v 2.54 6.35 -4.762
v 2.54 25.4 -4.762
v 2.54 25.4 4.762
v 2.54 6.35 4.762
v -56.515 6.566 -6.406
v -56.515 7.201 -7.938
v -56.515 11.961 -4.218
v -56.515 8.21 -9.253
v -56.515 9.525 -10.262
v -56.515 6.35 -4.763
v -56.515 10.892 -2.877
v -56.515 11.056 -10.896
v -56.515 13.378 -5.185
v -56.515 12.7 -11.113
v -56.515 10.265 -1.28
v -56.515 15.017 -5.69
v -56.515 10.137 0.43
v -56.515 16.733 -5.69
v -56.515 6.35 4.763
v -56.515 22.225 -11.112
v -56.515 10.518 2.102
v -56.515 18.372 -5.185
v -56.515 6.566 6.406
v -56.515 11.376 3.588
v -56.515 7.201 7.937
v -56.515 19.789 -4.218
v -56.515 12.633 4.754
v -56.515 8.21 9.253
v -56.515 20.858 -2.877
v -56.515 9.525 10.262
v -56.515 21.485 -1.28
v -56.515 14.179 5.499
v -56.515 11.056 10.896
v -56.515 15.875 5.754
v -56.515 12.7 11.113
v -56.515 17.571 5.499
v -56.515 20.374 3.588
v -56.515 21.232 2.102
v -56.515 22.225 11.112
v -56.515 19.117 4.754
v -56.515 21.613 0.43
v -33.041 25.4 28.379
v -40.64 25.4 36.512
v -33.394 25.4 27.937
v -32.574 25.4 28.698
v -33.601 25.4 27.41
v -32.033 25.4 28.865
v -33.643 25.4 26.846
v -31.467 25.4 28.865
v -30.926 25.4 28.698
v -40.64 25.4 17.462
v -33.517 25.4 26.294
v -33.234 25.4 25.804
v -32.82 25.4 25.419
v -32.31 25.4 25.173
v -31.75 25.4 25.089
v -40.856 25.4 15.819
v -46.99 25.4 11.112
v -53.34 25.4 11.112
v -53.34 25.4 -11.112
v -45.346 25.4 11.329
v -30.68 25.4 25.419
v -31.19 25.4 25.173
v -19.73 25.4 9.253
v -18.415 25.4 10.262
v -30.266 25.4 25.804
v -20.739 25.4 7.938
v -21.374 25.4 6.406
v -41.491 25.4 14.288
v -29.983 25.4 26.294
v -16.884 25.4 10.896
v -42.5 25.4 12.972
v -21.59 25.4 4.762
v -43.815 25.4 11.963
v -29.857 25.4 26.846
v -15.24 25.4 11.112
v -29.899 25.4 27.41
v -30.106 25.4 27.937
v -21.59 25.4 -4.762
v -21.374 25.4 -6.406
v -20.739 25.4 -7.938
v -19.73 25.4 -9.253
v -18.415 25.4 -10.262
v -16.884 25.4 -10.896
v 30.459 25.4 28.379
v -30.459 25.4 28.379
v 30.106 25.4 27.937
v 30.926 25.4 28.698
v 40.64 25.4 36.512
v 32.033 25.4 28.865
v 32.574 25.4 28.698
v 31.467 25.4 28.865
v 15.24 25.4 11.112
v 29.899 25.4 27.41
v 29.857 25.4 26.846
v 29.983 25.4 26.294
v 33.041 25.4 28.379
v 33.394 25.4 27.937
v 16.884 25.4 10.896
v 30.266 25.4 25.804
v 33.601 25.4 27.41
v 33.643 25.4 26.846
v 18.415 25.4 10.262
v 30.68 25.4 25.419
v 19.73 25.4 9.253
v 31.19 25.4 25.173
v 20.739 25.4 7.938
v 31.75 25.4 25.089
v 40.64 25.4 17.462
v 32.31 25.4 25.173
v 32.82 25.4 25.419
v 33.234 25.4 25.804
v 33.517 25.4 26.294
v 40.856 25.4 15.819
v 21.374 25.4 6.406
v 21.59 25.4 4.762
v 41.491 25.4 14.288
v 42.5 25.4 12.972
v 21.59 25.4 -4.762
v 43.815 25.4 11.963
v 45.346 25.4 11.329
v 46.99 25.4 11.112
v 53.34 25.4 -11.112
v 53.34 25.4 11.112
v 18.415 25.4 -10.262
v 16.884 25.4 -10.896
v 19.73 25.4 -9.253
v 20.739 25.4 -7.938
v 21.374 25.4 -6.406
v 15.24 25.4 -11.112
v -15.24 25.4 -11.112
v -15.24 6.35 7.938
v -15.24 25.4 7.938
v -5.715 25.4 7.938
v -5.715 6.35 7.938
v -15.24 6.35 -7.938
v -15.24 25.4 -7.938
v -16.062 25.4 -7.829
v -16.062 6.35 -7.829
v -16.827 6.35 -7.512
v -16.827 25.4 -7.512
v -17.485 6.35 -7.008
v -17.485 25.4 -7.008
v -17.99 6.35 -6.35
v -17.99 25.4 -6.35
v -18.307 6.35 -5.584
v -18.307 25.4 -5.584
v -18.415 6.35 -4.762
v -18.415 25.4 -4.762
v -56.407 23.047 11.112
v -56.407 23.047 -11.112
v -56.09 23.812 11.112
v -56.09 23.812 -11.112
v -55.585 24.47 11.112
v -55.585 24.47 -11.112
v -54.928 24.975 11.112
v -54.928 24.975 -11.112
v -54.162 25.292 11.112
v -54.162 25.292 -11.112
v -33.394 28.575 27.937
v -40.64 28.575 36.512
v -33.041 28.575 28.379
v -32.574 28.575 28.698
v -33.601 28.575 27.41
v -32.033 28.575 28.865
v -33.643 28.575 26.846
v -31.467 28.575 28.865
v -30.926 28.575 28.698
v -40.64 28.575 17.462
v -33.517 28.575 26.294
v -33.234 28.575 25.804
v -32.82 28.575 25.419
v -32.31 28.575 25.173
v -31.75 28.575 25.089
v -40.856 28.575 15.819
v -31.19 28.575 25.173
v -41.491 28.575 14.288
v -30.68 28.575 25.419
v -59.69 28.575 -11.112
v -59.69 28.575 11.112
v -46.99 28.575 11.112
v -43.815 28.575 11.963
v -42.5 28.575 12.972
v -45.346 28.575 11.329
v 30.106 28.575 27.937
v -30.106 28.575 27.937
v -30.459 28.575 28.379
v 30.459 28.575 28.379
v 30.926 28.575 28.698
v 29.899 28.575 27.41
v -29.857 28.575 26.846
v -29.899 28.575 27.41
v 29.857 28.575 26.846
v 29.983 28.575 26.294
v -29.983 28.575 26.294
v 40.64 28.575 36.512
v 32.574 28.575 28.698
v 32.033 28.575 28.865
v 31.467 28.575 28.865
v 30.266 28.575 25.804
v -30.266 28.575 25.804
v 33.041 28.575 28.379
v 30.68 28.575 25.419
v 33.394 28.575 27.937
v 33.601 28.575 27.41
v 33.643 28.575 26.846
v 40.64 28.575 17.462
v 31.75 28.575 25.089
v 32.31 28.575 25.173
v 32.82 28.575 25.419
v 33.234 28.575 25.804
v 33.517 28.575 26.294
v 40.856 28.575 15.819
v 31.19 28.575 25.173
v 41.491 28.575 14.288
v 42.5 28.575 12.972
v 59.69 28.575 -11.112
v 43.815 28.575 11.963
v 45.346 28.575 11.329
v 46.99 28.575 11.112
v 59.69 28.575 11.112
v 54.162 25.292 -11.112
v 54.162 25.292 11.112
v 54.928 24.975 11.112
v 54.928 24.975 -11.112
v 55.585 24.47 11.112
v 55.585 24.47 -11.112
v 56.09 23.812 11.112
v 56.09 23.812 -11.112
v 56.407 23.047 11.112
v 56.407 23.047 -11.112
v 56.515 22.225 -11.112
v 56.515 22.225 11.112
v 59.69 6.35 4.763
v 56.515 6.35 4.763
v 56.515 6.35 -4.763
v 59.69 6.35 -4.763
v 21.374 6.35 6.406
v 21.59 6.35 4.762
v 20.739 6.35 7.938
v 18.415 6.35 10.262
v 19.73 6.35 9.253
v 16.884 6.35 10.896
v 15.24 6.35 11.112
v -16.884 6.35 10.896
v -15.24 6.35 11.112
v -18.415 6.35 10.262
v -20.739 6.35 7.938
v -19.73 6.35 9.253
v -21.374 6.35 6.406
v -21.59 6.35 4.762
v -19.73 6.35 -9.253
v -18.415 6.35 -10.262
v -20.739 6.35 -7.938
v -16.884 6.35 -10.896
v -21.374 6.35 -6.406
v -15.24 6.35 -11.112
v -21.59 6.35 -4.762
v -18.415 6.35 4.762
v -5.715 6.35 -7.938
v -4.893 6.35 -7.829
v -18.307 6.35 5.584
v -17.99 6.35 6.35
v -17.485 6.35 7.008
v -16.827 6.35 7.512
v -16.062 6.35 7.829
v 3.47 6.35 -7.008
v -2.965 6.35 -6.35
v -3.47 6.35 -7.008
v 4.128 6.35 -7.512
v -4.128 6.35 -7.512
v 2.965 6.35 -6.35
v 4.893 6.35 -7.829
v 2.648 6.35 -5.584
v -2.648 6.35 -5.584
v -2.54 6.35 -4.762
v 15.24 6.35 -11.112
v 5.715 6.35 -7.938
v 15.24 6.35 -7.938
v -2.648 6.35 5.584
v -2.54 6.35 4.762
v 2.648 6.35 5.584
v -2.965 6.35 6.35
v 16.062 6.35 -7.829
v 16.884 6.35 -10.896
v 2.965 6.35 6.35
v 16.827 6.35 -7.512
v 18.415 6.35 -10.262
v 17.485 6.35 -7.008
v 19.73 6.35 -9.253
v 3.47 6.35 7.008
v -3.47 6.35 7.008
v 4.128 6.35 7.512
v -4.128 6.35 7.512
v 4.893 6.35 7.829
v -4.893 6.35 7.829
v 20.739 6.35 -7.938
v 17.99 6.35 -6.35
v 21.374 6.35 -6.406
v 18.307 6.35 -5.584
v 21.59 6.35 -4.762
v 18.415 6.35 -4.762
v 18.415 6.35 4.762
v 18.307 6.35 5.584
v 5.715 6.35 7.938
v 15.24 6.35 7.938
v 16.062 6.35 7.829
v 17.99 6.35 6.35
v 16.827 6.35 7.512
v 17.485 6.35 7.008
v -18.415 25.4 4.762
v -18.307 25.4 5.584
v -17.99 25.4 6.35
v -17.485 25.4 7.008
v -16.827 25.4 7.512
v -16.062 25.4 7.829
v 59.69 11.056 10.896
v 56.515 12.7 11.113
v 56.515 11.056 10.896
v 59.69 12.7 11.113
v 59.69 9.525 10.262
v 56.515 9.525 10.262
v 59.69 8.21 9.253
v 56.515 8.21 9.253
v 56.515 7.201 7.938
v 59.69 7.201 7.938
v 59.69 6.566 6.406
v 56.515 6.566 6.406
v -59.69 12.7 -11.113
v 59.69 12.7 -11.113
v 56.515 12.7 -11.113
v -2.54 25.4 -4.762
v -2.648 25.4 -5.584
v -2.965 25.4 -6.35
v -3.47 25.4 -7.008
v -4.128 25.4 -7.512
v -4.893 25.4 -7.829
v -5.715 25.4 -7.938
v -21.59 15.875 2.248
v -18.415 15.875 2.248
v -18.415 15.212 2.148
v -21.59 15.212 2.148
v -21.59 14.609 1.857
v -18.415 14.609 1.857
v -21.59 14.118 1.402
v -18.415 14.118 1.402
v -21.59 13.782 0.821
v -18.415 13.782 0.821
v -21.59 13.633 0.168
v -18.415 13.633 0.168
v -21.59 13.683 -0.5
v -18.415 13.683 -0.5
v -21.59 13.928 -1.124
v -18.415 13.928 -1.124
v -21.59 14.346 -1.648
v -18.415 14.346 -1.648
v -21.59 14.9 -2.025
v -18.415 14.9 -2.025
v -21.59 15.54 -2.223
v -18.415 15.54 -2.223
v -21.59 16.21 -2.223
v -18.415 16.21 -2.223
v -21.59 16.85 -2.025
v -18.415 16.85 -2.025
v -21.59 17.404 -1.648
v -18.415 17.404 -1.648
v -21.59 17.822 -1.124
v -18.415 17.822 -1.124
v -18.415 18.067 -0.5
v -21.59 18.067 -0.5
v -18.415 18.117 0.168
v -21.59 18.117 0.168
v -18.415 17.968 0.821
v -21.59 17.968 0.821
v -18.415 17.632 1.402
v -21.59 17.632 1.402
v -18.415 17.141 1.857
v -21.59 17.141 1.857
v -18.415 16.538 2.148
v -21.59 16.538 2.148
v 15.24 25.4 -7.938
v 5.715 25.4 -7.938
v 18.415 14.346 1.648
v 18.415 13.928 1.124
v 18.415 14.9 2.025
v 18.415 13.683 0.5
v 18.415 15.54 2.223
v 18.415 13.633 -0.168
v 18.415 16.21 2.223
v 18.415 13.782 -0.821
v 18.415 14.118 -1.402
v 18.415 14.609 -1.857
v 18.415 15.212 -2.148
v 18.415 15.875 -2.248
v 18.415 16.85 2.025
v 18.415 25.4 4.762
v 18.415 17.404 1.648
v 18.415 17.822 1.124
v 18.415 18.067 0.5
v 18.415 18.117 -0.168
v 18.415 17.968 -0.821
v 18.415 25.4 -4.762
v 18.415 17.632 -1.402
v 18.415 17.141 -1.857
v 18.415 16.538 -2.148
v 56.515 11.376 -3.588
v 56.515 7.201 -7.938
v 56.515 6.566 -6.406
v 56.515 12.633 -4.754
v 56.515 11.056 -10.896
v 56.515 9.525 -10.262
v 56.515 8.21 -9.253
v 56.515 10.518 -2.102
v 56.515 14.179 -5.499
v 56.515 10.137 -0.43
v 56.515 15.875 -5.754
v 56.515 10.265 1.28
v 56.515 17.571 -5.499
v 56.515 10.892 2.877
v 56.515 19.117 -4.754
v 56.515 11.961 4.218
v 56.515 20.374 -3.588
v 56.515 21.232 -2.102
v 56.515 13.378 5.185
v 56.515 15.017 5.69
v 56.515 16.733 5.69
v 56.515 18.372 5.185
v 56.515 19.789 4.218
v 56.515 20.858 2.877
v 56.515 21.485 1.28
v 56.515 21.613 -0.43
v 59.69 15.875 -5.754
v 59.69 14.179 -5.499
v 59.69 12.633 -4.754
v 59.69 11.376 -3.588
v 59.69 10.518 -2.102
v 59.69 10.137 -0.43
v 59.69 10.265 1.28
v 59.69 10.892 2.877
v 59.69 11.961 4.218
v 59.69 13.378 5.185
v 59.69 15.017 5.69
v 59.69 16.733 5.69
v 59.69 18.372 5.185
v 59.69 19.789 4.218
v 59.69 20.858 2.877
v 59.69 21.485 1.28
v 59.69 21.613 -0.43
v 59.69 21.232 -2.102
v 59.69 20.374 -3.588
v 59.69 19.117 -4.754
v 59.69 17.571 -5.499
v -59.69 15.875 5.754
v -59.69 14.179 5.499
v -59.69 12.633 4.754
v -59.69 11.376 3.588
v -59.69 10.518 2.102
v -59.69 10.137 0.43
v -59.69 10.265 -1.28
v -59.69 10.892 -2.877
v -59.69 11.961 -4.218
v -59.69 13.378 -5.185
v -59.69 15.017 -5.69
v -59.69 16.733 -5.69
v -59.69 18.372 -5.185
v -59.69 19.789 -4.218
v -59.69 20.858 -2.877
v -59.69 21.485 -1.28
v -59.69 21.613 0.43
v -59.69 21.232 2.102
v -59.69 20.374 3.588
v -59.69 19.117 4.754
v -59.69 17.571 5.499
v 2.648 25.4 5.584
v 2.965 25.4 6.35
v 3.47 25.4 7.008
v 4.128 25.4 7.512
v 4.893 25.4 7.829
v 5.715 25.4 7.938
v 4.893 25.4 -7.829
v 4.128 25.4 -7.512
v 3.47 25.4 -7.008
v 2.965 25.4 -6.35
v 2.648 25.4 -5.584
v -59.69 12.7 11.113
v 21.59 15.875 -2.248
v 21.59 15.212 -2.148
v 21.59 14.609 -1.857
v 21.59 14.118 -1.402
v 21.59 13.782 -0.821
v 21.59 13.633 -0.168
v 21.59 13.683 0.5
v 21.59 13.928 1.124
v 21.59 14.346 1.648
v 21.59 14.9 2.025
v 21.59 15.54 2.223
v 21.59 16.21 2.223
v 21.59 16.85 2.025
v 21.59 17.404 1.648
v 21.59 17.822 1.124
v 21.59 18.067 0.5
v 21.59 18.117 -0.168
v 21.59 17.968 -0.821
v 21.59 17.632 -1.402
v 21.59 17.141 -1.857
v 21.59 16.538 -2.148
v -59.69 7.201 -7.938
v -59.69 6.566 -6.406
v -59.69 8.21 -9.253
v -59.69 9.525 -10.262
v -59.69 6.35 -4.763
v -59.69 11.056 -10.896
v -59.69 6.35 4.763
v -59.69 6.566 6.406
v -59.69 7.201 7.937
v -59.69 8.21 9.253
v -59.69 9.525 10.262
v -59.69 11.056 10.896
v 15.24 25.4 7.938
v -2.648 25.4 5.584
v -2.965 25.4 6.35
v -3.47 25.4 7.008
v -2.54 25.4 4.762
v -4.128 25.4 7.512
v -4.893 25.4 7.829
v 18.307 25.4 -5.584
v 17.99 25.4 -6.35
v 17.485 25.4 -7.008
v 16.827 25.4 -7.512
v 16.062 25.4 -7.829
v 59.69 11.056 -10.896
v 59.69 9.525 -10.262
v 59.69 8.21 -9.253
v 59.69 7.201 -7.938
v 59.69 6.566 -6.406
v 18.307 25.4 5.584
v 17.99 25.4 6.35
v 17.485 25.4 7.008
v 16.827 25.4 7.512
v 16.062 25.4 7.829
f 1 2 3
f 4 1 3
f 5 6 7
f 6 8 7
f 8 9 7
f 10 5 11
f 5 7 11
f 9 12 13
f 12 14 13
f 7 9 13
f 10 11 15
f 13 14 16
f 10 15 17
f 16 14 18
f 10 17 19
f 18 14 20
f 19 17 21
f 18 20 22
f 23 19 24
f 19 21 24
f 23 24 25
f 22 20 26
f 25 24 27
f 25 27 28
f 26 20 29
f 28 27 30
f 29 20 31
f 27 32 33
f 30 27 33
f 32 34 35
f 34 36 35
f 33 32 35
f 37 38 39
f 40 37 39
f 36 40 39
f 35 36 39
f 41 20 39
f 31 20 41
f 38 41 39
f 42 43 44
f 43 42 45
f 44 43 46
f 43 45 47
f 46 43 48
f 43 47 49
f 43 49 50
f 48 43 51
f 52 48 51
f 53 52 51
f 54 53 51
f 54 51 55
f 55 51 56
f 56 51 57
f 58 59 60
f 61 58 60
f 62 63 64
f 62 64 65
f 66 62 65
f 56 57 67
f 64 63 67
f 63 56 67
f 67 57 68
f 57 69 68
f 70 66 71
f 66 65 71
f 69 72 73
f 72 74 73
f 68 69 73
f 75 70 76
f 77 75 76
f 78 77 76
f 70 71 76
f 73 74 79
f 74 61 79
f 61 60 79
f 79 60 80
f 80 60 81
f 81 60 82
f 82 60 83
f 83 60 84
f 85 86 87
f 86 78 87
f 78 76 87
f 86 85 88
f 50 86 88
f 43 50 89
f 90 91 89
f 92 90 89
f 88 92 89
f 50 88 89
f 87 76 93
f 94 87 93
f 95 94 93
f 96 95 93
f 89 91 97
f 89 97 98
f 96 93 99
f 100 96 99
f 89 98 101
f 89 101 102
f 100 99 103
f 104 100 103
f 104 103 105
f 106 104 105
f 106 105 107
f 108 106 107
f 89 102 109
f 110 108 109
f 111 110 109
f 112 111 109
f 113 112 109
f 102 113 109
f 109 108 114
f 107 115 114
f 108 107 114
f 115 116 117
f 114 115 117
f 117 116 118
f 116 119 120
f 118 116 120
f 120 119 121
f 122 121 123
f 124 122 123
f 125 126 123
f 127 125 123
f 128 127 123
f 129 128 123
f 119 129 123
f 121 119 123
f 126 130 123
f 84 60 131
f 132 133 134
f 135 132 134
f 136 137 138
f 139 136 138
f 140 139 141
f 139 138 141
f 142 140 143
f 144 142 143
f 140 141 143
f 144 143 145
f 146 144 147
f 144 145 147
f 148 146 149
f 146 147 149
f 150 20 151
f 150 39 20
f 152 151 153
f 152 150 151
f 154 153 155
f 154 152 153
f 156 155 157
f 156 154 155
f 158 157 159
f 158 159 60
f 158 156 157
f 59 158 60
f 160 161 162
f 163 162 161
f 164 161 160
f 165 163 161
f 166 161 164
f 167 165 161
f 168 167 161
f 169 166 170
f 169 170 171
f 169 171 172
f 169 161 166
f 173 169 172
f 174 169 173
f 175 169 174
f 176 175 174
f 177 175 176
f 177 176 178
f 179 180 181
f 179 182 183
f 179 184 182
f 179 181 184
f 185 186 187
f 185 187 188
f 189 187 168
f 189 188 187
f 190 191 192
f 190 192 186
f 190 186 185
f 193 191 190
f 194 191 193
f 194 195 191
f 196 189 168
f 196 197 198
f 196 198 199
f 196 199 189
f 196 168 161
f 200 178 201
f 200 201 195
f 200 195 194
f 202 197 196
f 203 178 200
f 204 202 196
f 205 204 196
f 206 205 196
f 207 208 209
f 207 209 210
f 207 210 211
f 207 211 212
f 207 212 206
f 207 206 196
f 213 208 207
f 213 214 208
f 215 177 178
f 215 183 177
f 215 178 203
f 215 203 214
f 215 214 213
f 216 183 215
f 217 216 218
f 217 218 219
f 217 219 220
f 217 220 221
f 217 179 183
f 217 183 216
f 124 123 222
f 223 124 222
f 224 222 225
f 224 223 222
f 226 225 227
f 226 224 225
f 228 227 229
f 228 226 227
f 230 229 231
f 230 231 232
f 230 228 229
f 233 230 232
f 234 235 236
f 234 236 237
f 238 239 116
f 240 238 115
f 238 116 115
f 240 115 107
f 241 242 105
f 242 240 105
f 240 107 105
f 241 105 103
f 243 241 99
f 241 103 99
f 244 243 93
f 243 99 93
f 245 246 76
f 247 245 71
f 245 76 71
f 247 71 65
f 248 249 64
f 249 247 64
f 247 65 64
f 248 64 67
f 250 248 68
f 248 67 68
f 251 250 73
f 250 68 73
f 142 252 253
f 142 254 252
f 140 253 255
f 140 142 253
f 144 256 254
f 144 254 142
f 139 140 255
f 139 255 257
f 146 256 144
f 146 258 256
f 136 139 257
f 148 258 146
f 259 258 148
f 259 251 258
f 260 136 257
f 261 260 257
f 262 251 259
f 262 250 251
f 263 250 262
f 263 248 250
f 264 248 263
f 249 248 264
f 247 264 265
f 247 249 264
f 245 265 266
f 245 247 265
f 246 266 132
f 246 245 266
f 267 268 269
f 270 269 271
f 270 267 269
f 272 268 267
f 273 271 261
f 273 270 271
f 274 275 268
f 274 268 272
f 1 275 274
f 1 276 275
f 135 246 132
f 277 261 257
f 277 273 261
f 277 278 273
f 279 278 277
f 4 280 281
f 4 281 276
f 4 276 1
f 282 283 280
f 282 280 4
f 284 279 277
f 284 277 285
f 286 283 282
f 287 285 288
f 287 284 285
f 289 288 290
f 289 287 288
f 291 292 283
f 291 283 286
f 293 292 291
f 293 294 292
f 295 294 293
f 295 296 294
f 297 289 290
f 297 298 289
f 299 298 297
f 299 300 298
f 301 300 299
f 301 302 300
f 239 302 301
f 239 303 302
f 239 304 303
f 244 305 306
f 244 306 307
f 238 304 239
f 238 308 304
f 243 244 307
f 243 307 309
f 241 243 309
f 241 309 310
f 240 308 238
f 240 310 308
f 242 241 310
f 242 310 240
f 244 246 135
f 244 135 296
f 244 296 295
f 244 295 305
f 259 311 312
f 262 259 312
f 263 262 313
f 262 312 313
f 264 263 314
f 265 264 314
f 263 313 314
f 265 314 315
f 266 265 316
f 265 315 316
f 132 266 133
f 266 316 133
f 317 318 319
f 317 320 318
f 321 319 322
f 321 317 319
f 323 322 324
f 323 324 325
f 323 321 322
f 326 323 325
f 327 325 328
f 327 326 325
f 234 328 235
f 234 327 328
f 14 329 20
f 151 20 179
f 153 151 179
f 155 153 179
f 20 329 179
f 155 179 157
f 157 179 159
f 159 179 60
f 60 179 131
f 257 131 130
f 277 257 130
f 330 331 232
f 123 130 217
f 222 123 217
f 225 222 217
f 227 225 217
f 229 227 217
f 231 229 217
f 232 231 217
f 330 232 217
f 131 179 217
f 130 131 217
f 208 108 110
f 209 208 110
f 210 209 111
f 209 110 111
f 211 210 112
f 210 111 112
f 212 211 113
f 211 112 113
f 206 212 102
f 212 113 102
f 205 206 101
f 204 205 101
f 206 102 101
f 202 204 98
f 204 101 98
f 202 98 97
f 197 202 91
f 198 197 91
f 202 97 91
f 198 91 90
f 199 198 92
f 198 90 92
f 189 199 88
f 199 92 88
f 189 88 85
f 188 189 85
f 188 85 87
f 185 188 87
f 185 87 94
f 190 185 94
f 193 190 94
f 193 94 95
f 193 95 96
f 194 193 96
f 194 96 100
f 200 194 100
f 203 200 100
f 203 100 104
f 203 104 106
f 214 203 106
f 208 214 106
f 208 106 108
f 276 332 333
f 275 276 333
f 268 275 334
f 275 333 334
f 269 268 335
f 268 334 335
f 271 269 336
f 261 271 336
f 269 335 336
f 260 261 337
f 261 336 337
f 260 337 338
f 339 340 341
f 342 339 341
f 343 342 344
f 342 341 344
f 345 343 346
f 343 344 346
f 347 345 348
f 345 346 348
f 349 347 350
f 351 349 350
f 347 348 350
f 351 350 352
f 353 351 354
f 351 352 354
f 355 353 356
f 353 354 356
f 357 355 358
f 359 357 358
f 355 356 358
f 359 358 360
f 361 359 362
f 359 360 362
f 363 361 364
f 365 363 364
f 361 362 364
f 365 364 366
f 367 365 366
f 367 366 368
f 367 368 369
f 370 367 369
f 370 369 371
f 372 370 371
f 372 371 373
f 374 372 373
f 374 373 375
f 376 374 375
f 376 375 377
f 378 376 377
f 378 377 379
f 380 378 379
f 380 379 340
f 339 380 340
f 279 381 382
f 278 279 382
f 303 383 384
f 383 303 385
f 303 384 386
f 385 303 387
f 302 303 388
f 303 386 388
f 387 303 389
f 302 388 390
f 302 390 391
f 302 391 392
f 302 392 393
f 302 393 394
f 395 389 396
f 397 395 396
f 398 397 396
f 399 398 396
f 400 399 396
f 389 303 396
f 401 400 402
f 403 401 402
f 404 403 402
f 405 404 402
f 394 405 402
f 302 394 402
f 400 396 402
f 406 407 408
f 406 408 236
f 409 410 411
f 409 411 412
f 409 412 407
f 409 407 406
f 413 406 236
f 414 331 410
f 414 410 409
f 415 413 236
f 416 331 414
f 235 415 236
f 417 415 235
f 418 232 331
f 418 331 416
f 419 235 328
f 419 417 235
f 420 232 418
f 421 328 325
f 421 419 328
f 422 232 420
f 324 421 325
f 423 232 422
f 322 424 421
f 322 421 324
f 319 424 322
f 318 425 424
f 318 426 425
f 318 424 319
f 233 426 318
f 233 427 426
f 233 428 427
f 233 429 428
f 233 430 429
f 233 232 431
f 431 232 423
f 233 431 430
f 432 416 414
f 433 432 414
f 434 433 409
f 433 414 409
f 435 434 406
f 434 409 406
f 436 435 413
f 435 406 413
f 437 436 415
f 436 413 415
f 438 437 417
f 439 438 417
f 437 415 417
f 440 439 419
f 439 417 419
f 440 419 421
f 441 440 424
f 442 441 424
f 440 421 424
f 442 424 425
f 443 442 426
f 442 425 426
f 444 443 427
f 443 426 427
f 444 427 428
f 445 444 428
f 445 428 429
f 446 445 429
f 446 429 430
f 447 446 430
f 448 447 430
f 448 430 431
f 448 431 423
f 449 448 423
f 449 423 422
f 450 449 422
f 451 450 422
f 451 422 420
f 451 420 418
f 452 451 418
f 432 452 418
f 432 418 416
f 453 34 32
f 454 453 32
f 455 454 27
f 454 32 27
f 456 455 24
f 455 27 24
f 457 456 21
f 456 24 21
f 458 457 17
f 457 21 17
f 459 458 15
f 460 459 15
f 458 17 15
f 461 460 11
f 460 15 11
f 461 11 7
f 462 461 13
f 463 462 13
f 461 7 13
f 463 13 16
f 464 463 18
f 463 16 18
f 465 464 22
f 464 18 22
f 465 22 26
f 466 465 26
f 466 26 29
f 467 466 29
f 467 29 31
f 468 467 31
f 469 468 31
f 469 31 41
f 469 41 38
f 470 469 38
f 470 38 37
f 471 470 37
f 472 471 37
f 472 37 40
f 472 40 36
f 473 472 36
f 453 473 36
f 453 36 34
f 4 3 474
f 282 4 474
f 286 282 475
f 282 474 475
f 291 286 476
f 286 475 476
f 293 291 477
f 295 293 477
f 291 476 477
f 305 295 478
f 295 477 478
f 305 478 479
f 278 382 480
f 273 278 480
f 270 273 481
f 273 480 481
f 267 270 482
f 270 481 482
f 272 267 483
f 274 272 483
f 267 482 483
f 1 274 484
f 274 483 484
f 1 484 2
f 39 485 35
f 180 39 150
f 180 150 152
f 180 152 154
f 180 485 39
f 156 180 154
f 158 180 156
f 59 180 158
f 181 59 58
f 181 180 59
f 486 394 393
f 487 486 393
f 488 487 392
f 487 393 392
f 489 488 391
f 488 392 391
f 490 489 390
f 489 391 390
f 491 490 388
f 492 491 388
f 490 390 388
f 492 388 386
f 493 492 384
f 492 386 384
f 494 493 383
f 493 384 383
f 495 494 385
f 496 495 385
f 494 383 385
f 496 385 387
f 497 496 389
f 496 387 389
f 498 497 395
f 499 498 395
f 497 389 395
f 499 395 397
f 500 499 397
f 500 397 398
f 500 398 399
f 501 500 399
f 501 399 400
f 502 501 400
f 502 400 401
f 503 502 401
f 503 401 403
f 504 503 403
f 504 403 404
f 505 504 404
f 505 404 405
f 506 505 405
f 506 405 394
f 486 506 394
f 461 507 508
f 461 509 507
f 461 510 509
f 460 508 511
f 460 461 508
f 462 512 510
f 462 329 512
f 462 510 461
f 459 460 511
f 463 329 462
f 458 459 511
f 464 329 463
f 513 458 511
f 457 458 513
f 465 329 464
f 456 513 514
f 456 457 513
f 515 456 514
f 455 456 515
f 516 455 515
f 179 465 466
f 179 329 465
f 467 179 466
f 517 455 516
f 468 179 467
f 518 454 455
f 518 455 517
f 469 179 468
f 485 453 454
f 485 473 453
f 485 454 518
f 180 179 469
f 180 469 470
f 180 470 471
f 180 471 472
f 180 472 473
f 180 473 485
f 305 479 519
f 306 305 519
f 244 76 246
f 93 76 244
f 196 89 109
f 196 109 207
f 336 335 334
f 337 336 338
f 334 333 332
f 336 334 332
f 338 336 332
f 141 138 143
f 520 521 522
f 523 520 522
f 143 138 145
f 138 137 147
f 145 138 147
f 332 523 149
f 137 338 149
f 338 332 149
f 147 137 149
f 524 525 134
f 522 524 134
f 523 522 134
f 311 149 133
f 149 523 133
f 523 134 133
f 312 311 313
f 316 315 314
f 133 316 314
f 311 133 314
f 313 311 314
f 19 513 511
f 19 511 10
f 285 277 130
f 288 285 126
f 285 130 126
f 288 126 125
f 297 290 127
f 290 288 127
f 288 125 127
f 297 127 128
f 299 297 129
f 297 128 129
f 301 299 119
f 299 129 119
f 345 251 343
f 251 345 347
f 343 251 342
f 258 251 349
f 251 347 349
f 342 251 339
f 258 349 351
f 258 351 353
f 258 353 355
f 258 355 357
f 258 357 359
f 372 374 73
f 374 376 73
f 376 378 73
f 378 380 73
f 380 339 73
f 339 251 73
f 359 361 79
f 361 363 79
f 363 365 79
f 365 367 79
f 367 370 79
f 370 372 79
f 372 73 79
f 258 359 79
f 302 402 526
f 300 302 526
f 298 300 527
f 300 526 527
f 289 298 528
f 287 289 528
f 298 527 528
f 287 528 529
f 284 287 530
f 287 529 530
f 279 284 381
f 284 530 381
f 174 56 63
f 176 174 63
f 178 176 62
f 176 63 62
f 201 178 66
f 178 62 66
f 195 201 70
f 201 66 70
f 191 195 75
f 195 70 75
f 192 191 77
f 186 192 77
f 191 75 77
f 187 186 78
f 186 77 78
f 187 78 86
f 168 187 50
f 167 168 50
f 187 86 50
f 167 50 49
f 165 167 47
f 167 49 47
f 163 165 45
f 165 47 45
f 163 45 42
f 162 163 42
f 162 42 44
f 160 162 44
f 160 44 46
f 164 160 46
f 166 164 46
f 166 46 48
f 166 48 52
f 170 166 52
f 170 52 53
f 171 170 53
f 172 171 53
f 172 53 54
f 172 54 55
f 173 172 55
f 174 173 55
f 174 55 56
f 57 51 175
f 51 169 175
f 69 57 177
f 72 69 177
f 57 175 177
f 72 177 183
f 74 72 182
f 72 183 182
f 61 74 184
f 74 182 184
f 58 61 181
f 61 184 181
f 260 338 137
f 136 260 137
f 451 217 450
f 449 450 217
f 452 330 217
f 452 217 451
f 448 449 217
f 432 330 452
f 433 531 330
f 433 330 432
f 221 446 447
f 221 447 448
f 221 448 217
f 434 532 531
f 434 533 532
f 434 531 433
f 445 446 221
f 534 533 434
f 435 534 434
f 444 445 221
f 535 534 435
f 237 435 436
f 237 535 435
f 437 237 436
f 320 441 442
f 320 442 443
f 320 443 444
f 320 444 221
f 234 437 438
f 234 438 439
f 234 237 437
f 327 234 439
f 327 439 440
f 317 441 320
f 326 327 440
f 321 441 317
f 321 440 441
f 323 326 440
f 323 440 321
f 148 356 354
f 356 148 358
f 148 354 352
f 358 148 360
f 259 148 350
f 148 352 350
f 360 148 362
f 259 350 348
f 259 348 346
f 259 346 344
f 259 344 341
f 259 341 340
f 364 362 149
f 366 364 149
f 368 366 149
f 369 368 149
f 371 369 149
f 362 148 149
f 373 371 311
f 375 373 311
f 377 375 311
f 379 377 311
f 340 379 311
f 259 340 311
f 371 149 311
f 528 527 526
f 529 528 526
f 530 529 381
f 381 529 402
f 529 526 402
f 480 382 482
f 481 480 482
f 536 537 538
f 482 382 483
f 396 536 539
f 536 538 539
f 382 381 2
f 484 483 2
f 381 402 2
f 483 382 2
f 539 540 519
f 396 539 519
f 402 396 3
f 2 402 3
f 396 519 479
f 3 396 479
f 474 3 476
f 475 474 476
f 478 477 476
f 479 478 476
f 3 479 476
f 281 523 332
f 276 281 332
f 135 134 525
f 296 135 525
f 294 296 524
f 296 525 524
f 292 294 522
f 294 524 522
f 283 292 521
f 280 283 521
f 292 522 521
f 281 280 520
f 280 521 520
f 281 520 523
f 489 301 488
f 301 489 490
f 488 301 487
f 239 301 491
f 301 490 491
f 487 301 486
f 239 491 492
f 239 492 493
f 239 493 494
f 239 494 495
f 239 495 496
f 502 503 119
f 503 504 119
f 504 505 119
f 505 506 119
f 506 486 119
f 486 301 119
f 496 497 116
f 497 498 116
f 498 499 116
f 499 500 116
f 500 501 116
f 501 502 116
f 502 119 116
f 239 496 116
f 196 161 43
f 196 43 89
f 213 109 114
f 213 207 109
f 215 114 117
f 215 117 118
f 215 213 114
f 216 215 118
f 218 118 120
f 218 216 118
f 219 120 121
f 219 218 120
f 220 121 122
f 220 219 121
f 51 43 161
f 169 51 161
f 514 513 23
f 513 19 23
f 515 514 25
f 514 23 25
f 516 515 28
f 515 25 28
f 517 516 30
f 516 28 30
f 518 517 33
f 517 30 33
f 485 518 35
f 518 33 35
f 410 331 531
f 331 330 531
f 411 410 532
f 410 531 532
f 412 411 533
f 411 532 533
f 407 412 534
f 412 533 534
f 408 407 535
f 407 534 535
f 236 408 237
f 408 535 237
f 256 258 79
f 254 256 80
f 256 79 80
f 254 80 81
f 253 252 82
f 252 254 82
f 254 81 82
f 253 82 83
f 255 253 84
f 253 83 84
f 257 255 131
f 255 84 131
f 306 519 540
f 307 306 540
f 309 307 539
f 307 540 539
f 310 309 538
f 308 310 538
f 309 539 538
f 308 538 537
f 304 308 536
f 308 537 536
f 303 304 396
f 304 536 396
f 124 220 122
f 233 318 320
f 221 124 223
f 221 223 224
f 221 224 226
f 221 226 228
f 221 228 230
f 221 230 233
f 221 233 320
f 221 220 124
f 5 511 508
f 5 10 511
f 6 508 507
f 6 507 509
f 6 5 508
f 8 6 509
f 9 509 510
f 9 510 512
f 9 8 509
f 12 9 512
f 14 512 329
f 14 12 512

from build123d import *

# Parameters (mm, degrees)
EXTRUDE1_DEPTH                         = 25.4
EXTRUDE1_DEPTH_BACK                    = 50.8
SKETCH2_W                              = 119.38
SKETCH2_H                              = 22.225
EXTRUDE2_DEPTH                         = 3.175
SKETCH3_W                              = 3.175
SKETCH3_H                              = 22.225
EXTRUDE3_DEPTH                         = 19.05
TAP_DRILL_FOR_1_2_TAP1_D               = 11.50874
TAP_DRILL_FOR_1_2_TAP1_DEPTH           = 6.35
TAP_DRILL_FOR_1_2_TAP1_TIP             = 3.45757432
TAP_DRILL_FOR_1_2_TAP1_ON_FACE_2_D     = 11.50874
TAP_DRILL_FOR_1_2_TAP1_ON_FACE_2_DEPTH = 6.35
TAP_DRILL_FOR_1_2_TAP1_ON_FACE_2_TIP   = 3.45757432
F_8_CLEARANCE_HOLE1_D                  = 4.4958
F_8_CLEARANCE_HOLE1_DEPTH              = 6.35
F_8_CLEARANCE_HOLE1_TIP                = 1.350674586
F_8_CLEARANCE_HOLE1_ON_FACE_2_D        = 4.4958
F_8_CLEARANCE_HOLE1_ON_FACE_2_DEPTH    = 6.35
F_8_CLEARANCE_HOLE1_ON_FACE_2_TIP      = 1.350674586
FILLET1_R                              = 6.35
FILLET3_R                              = 3.175
SKETCH7_W                              = 81.28
SKETCH7_H                              = 3.175
EXTRUDE4_DEPTH                         = 25.4
FILLET4_R                              = 6.35
F_6_CLEARANCE_HOLE1_D                  = 3.7973
F_6_CLEARANCE_HOLE1_DEPTH              = 9.652
F_6_CLEARANCE_HOLE1_TIP                = 1.140824014
SKETCH8_W                              = 66.338719692
SKETCH8_H                              = 61.141500313
CUT_EXTRUDE1_DEPTH                     = 57.15


with BuildPart() as part:
    # Sketch1 → Extrude1 (new body, two sides)
    with BuildSketch(Plane(origin=(0, 0, 0), x_dir=(1, 0, 0), z_dir=(0, 1, 0))) as extrude1_sk:
        with BuildLine():
            Line((15.24, -11.1125), (-15.24, -11.1125))
            ThreePointArc((-15.24, -11.1125), (-19.730128061, -9.252628061), (-21.59, -4.7625))
            Line((-21.59, -4.7625), (-21.59, 4.7625))
            ThreePointArc((-21.59, 4.7625), (-19.730128061, 9.252628061), (-15.24, 11.1125))
            Line((-15.24, 11.1125), (15.24, 11.1125))
            ThreePointArc((15.24, 11.1125), (19.730128061, 9.252628061), (21.59, 4.7625))
            Line((21.59, 4.7625), (21.59, -4.7625))
            ThreePointArc((21.59, -4.7625), (19.730128061, -9.252628061), (15.24, -11.1125))
        make_face()
        with BuildLine():
            Line((-15.24, -7.9375), (-5.715, -7.9375))
            ThreePointArc((-5.715, -7.9375), (-3.46993597, -7.00756403), (-2.54, -4.7625))
            Line((-2.54, -4.7625), (-2.54, 4.7625))
            ThreePointArc((-2.54, 4.7625), (-3.46993597, 7.00756403), (-5.715, 7.9375))
            Line((-5.715, 7.9375), (-15.24, 7.9375))
            ThreePointArc((-15.24, 7.9375), (-17.48506403, 7.00756403), (-18.415, 4.7625))
            Line((-18.415, 4.7625), (-18.415, -4.7625))
            ThreePointArc((-18.415, -4.7625), (-17.48506403, -7.00756403), (-15.24, -7.9375))
        make_face(mode=Mode.SUBTRACT)
        with BuildLine():
            Line((15.24, 7.9375), (5.715, 7.9375))
            ThreePointArc((5.715, 7.9375), (3.46993597, 7.00756403), (2.54, 4.7625))
            Line((2.54, 4.7625), (2.54, -4.7625))
            ThreePointArc((2.54, -4.7625), (3.46993597, -7.00756403), (5.715, -7.9375))
            Line((5.715, -7.9375), (15.24, -7.9375))
            ThreePointArc((15.24, -7.9375), (17.48506403, -7.00756403), (18.415, -4.7625))
            Line((18.415, -4.7625), (18.415, 4.7625))
            ThreePointArc((18.415, 4.7625), (17.48506403, 7.00756403), (15.24, 7.9375))
        make_face(mode=Mode.SUBTRACT)
    extrude(amount=EXTRUDE1_DEPTH)
    extrude(extrude1_sk.sketch, amount=-EXTRUDE1_DEPTH_BACK)

    # Sketch2 → Extrude2 (add)
    with BuildSketch(Plane(origin=(0, 25.4, 0), x_dir=(-1, 0, 0), z_dir=(0, 1, 0))):
        Rectangle(SKETCH2_W, SKETCH2_H)
    extrude(amount=EXTRUDE2_DEPTH)

    # Sketch3 → Extrude3 (add)
    with BuildSketch(Plane.XZ.offset(-25.4)):
        with Locations((-58.1025, 0)):
            Rectangle(SKETCH3_W, SKETCH3_H)
        with Locations((58.1025, 0)):
            Rectangle(SKETCH3_W, SKETCH3_H)
    extrude(amount=EXTRUDE3_DEPTH)

    # Tap Drill for 1/2 Tap1
    with Locations(Plane(origin=(-59.69, 15.875, 0), x_dir=(0, 0, -1), z_dir=(-1, 0, 0))):
        with Locations((0, 0)):
            Hole(TAP_DRILL_FOR_1_2_TAP1_D / 2, depth=TAP_DRILL_FOR_1_2_TAP1_DEPTH)
            with Locations((0, 0, -(TAP_DRILL_FOR_1_2_TAP1_DEPTH + TAP_DRILL_FOR_1_2_TAP1_TIP / 2))):  # 118° drill point
                Cone(0, TAP_DRILL_FOR_1_2_TAP1_D / 2, TAP_DRILL_FOR_1_2_TAP1_TIP, mode=Mode.SUBTRACT)

    # Tap Drill for 1/2 Tap1 on face 2
    with Locations(Plane(origin=(59.69, 15.875, 0), x_dir=(0, 0, 1), z_dir=(1, 0, 0))):
        with Locations((0, 0)):
            Hole(TAP_DRILL_FOR_1_2_TAP1_ON_FACE_2_D / 2, depth=TAP_DRILL_FOR_1_2_TAP1_ON_FACE_2_DEPTH)
            with Locations((0, 0, -(TAP_DRILL_FOR_1_2_TAP1_ON_FACE_2_DEPTH + TAP_DRILL_FOR_1_2_TAP1_ON_FACE_2_TIP / 2))):  # 118° drill point
                Cone(0, TAP_DRILL_FOR_1_2_TAP1_ON_FACE_2_D / 2, TAP_DRILL_FOR_1_2_TAP1_ON_FACE_2_TIP, mode=Mode.SUBTRACT)

    # #8 Clearance Hole1
    with Locations(Plane(origin=(-21.59, 15.875, 0), x_dir=(0, 0, -1), z_dir=(-1, 0, 0))):
        with Locations((0, 0)):
            Hole(F_8_CLEARANCE_HOLE1_D / 2, depth=F_8_CLEARANCE_HOLE1_DEPTH)
            with Locations((0, 0, -(F_8_CLEARANCE_HOLE1_DEPTH + F_8_CLEARANCE_HOLE1_TIP / 2))):  # 118° drill point
                Cone(0, F_8_CLEARANCE_HOLE1_D / 2, F_8_CLEARANCE_HOLE1_TIP, mode=Mode.SUBTRACT)

    # #8 Clearance Hole1 on face 2
    with Locations(Plane(origin=(21.59, 15.875, 0), x_dir=(0, 0, 1), z_dir=(1, 0, 0))):
        with Locations((0, 0)):
            Hole(F_8_CLEARANCE_HOLE1_ON_FACE_2_D / 2, depth=F_8_CLEARANCE_HOLE1_ON_FACE_2_DEPTH)
            with Locations((0, 0, -(F_8_CLEARANCE_HOLE1_ON_FACE_2_DEPTH + F_8_CLEARANCE_HOLE1_ON_FACE_2_TIP / 2))):  # 118° drill point
                Cone(0, F_8_CLEARANCE_HOLE1_ON_FACE_2_D / 2, F_8_CLEARANCE_HOLE1_ON_FACE_2_TIP, mode=Mode.SUBTRACT)

    # Fillet1
    fillet1_edges = [part.edges().sort_by_distance(p)[0] for p in [
        (-58.1025, 6.35, -11.1125),
        (-58.1025, 6.35, 11.1125),
        (58.1025, 6.35, 11.1125),
        (58.1025, 6.35, -11.1125),
    ]]
    fillet(fillet1_edges, radius=FILLET1_R)

    # Fillet3
    fillet3_edges = [part.edges().sort_by_distance(p)[0] for p in [
        (-56.515, 25.4, 0),
        (56.515, 25.4, 0),
    ]]
    fillet(fillet3_edges, radius=FILLET3_R)

    # Sketch7 → Extrude4 (add)
    with BuildSketch(Plane.XY.offset(11.1125)):
        with Locations((0, 26.9875)):
            Rectangle(SKETCH7_W, SKETCH7_H)
    extrude(amount=EXTRUDE4_DEPTH)

    # Fillet4
    fillet4_edges = [part.edges().sort_by_distance(p)[0] for p in [
        (-40.64, 26.9875, 11.1125),
        (40.64, 26.9875, 11.1125),
    ]]
    fillet(fillet4_edges, radius=FILLET4_R)

    # #6 Clearance Hole1
    with Locations(Plane(origin=(31.75, 28.575, 26.9875), x_dir=(0, 0, 1), z_dir=(0, 1, 0))):
        with Locations((0, 0), (0, -63.5)):
            Hole(F_6_CLEARANCE_HOLE1_D / 2, depth=F_6_CLEARANCE_HOLE1_DEPTH)
            with Locations((0, 0, -(F_6_CLEARANCE_HOLE1_DEPTH + F_6_CLEARANCE_HOLE1_TIP / 2))):  # 118° drill point
                Cone(0, F_6_CLEARANCE_HOLE1_D / 2, F_6_CLEARANCE_HOLE1_TIP, mode=Mode.SUBTRACT)

    # Sketch8 → Cut-Extrude1 (cut)
    with BuildSketch(Plane.XZ.offset(50.8)):
        with Locations((-0.031295894, -3.796156427)):
            Rectangle(SKETCH8_W, SKETCH8_H)
    extrude(amount=-CUT_EXTRUDE1_DEPTH, mode=Mode.SUBTRACT)


solid = part.part
